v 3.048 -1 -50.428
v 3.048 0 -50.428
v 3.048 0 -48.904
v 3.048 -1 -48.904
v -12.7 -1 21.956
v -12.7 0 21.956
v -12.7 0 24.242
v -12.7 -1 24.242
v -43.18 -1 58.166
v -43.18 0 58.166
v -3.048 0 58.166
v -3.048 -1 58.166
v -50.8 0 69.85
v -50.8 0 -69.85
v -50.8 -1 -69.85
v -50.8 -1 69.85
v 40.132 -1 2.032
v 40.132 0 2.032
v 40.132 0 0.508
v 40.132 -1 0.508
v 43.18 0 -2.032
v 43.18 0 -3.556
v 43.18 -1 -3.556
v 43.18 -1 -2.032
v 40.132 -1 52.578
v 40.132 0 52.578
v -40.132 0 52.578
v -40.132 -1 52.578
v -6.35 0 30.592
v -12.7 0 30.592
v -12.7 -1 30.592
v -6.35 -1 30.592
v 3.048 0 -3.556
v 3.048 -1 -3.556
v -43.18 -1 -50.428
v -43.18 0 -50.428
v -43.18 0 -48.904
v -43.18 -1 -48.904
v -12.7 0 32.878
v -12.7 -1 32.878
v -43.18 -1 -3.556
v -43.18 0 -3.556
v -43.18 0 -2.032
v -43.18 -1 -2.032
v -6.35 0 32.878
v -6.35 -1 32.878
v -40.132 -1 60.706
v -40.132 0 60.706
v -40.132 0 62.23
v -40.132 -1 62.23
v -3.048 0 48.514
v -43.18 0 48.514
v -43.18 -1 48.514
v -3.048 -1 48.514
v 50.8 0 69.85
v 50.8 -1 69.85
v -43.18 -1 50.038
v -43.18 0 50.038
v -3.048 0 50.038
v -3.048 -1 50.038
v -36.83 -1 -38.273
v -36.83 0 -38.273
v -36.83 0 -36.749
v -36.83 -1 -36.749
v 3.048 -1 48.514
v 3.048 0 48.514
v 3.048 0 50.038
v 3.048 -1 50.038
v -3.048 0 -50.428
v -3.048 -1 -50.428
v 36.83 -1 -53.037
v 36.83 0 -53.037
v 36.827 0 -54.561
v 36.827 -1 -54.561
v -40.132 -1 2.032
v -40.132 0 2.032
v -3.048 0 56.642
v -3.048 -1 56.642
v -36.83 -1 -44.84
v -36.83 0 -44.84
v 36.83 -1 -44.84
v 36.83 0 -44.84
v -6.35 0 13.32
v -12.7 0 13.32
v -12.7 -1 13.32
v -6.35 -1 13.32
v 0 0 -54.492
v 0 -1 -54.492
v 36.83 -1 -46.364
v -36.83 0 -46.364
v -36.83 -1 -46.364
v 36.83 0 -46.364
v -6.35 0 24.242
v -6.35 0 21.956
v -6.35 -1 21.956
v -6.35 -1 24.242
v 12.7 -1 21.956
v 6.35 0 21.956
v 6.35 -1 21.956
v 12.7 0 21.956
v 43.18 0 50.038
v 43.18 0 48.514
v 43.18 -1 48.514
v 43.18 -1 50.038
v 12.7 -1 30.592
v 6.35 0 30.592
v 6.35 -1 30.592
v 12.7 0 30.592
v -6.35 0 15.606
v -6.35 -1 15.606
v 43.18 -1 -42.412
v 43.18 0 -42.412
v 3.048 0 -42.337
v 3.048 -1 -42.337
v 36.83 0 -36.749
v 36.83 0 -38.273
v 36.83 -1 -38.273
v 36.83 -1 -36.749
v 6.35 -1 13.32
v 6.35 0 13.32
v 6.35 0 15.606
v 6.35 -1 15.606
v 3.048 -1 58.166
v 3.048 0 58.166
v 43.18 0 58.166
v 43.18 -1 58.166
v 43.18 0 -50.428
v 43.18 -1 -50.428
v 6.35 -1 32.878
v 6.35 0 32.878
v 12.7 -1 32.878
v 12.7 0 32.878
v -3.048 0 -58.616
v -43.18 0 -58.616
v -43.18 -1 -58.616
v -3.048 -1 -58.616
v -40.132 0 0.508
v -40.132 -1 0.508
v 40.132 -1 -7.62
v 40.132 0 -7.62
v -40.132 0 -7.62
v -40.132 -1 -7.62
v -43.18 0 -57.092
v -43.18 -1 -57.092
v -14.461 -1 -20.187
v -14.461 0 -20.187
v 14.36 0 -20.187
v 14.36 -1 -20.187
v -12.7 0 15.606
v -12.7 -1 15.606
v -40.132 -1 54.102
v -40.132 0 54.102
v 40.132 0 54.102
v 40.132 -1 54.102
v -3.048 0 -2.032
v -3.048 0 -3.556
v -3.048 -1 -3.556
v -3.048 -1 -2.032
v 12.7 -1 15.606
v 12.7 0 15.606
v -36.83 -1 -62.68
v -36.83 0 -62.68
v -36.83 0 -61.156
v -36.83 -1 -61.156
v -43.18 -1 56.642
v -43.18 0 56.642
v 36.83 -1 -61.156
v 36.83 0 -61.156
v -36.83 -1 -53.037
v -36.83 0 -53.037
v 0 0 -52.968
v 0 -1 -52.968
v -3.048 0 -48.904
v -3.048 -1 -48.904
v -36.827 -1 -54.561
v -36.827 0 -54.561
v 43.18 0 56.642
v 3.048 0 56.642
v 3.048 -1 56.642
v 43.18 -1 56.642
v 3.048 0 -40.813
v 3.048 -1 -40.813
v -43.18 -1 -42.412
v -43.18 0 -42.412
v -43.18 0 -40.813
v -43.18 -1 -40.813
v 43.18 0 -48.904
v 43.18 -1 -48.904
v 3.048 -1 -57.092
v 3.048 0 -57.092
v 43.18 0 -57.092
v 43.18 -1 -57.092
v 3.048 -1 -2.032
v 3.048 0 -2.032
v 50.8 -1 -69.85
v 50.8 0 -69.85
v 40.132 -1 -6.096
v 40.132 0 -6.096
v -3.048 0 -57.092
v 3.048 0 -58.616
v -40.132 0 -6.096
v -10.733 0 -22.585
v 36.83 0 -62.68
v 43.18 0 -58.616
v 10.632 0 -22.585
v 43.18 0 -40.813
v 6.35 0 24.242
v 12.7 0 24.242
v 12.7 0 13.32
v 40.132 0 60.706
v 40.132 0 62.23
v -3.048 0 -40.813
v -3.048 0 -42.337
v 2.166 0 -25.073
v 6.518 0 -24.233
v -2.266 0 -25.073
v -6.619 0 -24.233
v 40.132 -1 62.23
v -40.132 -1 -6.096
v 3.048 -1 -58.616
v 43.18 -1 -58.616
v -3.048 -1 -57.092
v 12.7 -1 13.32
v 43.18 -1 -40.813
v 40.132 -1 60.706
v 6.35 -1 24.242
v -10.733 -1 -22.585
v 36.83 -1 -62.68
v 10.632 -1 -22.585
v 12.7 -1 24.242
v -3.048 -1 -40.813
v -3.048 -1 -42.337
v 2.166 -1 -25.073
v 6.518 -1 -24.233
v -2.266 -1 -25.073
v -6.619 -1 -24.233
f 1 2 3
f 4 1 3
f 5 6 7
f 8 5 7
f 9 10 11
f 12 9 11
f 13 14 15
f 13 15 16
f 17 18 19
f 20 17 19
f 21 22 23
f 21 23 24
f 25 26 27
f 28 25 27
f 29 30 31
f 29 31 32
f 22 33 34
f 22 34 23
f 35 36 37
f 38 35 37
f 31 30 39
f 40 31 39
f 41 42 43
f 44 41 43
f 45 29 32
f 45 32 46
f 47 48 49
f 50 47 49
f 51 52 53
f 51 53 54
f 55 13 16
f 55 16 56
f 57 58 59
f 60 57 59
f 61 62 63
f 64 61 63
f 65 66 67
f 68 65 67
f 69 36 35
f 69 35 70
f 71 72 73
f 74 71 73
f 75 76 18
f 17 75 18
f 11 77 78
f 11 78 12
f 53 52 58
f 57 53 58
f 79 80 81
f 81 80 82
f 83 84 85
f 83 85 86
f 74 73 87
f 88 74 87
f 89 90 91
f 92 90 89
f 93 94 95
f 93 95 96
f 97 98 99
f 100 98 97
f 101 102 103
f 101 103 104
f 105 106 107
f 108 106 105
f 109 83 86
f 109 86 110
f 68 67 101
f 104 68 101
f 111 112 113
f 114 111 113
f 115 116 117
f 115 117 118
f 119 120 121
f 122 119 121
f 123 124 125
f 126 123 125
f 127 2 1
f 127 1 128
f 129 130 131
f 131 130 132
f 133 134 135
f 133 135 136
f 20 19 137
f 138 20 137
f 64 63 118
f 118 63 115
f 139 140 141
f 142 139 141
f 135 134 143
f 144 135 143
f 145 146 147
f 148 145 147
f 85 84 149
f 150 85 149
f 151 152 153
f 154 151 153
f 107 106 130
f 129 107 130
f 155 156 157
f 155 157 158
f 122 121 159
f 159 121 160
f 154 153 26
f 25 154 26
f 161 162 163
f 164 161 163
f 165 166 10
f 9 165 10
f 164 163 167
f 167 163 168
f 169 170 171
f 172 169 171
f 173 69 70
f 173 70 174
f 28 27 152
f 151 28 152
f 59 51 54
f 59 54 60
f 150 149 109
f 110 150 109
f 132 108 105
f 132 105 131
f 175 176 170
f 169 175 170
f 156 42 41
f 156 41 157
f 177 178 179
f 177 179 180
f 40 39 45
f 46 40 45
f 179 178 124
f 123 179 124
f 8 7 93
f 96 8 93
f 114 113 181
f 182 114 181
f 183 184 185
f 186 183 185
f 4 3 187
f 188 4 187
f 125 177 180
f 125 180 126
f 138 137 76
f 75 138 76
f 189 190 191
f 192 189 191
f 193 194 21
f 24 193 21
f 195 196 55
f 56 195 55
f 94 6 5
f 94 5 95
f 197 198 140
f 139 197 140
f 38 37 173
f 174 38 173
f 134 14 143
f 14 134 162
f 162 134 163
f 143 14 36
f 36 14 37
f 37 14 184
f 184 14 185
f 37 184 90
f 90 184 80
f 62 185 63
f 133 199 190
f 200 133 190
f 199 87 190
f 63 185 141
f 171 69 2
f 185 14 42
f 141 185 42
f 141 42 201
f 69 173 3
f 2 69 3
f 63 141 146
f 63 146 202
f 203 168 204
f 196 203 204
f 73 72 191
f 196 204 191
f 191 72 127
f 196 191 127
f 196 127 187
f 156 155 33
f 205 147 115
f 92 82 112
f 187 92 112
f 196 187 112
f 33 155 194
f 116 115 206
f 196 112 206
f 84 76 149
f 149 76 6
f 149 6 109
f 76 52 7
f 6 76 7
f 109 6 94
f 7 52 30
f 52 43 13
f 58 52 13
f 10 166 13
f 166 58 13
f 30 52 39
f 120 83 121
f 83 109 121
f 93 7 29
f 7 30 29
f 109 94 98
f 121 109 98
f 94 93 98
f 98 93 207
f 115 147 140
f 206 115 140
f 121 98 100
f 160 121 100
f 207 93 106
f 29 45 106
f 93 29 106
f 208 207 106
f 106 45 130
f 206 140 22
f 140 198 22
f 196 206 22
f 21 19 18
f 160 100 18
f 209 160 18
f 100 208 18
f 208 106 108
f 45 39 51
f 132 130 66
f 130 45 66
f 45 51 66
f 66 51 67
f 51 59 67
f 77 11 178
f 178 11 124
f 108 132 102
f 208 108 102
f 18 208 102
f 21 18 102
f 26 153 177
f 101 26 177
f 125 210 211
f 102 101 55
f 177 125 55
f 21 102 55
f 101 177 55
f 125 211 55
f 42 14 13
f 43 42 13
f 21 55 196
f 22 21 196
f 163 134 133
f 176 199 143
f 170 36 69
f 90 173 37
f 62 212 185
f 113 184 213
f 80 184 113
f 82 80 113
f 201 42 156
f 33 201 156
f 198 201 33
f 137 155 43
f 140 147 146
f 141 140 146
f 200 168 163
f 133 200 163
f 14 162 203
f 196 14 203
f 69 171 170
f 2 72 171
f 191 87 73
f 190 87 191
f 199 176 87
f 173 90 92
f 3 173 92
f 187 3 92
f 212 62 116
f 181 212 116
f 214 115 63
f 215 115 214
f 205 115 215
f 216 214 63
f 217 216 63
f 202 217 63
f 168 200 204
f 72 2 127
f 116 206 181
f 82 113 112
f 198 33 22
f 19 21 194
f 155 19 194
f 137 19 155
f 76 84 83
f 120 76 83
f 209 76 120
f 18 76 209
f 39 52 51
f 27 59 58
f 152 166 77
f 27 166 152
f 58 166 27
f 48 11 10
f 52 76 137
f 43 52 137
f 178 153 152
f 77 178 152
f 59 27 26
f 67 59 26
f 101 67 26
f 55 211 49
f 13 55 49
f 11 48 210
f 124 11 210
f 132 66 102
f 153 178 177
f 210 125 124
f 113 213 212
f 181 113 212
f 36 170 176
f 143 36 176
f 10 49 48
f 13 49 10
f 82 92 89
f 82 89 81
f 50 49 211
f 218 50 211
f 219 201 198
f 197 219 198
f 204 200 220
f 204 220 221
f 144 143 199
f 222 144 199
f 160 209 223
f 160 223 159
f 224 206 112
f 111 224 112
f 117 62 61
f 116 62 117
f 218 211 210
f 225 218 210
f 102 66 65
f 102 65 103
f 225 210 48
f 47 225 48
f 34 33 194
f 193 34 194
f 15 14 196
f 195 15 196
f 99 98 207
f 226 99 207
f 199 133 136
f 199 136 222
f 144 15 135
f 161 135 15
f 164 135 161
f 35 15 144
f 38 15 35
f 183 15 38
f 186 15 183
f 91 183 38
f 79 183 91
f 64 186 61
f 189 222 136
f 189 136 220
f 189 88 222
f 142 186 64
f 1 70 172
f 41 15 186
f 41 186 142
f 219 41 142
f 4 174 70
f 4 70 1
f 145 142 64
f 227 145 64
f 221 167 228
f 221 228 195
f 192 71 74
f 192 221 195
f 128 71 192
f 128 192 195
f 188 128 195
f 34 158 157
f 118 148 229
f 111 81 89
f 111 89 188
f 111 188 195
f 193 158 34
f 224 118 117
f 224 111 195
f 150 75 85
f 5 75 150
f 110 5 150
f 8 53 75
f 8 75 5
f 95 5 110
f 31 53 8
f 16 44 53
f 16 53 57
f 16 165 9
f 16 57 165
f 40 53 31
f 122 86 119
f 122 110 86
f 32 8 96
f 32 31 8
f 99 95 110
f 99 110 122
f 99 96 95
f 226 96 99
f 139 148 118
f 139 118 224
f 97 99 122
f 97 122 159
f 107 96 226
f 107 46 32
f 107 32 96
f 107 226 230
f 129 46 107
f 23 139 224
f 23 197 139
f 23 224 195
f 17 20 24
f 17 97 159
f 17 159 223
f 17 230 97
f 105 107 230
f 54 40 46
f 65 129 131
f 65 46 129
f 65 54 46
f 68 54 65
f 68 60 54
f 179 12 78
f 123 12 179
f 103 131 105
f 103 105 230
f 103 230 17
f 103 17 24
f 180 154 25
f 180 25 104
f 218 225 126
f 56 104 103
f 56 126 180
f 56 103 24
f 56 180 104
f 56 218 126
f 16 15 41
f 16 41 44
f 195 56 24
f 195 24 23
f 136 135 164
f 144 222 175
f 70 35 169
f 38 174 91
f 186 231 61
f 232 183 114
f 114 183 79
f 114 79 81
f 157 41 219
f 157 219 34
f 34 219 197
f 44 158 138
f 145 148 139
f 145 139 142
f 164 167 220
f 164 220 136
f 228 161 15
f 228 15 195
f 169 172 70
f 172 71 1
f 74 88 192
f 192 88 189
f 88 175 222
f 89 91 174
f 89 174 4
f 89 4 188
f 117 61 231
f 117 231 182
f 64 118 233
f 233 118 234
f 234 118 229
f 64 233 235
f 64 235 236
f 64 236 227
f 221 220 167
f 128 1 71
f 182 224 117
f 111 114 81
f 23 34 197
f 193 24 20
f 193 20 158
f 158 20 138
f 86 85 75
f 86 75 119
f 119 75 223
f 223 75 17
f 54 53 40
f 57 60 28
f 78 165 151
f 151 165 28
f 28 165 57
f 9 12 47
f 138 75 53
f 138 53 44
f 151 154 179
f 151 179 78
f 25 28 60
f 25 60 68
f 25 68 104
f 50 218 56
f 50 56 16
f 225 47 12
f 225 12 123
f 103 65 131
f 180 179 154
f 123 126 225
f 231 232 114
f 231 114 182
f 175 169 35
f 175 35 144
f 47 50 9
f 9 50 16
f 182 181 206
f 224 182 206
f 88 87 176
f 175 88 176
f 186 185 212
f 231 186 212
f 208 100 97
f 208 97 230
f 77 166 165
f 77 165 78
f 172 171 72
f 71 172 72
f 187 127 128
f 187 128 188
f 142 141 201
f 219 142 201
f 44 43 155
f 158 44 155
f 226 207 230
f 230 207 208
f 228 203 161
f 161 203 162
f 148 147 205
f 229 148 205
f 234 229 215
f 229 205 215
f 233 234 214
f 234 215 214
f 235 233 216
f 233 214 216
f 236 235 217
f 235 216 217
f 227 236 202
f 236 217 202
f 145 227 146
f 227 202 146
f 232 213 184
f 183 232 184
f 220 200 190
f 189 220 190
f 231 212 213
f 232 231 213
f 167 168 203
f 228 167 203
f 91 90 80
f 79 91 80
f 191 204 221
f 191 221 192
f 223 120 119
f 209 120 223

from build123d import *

# Parameters (mm, degrees)
F0_W     = 101.6
F0_H     = 139.7
F0_W_2   = 40.132
F0_H_2   = 1.524
F0_W_3   = 73.66
F0_W_4   = 6.35
F0_H_3   = 2.286
F1_DEPTH = 1


with BuildPart() as f1:
    # F0 (on Front) → F1 (new body)
    with BuildSketch(Plane.XZ):
        Rectangle(F0_W, F0_H)
        with Locations((-23.114, -57.854202)):
            Rectangle(F0_W_2, F0_H_2, mode=Mode.SUBTRACT)
        Polygon((-36.83, -61.156202), (0, -61.156202), (36.83, -61.156202), (36.83, -62.680202), (0, -62.680202), (-36.83, -62.680202), align=None, mode=Mode.SUBTRACT)
        Polygon((-36.829936, -53.036838), (0, -52.968277), (36.829936, -53.036838), (36.827099, -54.560835), (0, -54.49228), (-36.827099, -54.560835), align=None, mode=Mode.SUBTRACT)
        with Locations((-23.114, -49.666277)):
            Rectangle(F0_W_2, F0_H_2, mode=Mode.SUBTRACT)
        Polygon((-43.18, -42.336936), (-43.18, -40.812936), (-3.048, -40.812936), (-3.048, -42.336936), (-43.18, -42.411644), align=None, mode=Mode.SUBTRACT)
        with Locations((0, -45.602277)):
            Rectangle(F0_W_3, F0_H_2, mode=Mode.SUBTRACT)
        with Locations((0, -37.510936)):
            Rectangle(F0_W_3, F0_H_2, mode=Mode.SUBTRACT)
        with BuildLine():
            ThreePointArc((14.359987, -20.186644), (-0.050304, -25.178638), (-14.460596, -20.186644))
            Line((-14.460596, -20.186644), (14.359987, -20.186644))
        make_face(mode=Mode.SUBTRACT)
        with Locations((-23.114, -2.794)):
            Rectangle(F0_W_2, F0_H_2, mode=Mode.SUBTRACT)
        Polygon((40.132, -7.62), (0, -7.62), (-40.132, -7.62), (-40.132, -6.096), (0, -6.096), (40.132, -6.096), align=None, mode=Mode.SUBTRACT)
        with Locations((23.114, -57.854202)):
            Rectangle(F0_W_2, F0_H_2, mode=Mode.SUBTRACT)
        with Locations((23.114, -49.666277)):
            Rectangle(F0_W_2, F0_H_2, mode=Mode.SUBTRACT)
        Polygon((3.048, -40.812936), (43.18, -40.812936), (43.18, -42.411644), (3.048, -42.336936), align=None, mode=Mode.SUBTRACT)
        with Locations((23.114, -2.794)):
            Rectangle(F0_W_2, F0_H_2, mode=Mode.SUBTRACT)
        Polygon((40.132, 0.508), (0, 0.508), (-40.132, 0.508), (-40.132, 2.032), (0, 2.032), (40.132, 2.032), align=None, mode=Mode.SUBTRACT)
        with Locations((-9.525, 14.46316)):
            Rectangle(F0_W_4, F0_H_3, mode=Mode.SUBTRACT)
        with Locations((-9.525, 23.09916)):
            Rectangle(F0_W_4, F0_H_3, mode=Mode.SUBTRACT)
        with Locations((-9.525, 31.73516)):
            Rectangle(F0_W_4, F0_H_3, mode=Mode.SUBTRACT)
        with Locations((-23.114, 49.276)):
            Rectangle(F0_W_2, F0_H_2, mode=Mode.SUBTRACT)
        with Locations((-23.114, 57.404)):
            Rectangle(F0_W_2, F0_H_2, mode=Mode.SUBTRACT)
        Polygon((-40.132, 54.102), (0, 54.102), (40.132, 54.102), (40.132, 52.578), (0, 52.578), (-40.132, 52.578), align=None, mode=Mode.SUBTRACT)
        Polygon((-40.132, 62.23), (0, 62.23), (40.132, 62.23), (40.132, 60.706), (0, 60.706), (-40.132, 60.706), align=None, mode=Mode.SUBTRACT)
        with Locations((9.525, 14.46316)):
            Rectangle(F0_W_4, F0_H_3, mode=Mode.SUBTRACT)
        with Locations((9.525, 23.09916)):
            Rectangle(F0_W_4, F0_H_3, mode=Mode.SUBTRACT)
        with Locations((9.525, 31.73516)):
            Rectangle(F0_W_4, F0_H_3, mode=Mode.SUBTRACT)
        with Locations((23.114, 49.276)):
            Rectangle(F0_W_2, F0_H_2, mode=Mode.SUBTRACT)
        with Locations((23.114, 57.404)):
            Rectangle(F0_W_2, F0_H_2, mode=Mode.SUBTRACT)
    extrude(amount=F1_DEPTH)


solid = f1.part
